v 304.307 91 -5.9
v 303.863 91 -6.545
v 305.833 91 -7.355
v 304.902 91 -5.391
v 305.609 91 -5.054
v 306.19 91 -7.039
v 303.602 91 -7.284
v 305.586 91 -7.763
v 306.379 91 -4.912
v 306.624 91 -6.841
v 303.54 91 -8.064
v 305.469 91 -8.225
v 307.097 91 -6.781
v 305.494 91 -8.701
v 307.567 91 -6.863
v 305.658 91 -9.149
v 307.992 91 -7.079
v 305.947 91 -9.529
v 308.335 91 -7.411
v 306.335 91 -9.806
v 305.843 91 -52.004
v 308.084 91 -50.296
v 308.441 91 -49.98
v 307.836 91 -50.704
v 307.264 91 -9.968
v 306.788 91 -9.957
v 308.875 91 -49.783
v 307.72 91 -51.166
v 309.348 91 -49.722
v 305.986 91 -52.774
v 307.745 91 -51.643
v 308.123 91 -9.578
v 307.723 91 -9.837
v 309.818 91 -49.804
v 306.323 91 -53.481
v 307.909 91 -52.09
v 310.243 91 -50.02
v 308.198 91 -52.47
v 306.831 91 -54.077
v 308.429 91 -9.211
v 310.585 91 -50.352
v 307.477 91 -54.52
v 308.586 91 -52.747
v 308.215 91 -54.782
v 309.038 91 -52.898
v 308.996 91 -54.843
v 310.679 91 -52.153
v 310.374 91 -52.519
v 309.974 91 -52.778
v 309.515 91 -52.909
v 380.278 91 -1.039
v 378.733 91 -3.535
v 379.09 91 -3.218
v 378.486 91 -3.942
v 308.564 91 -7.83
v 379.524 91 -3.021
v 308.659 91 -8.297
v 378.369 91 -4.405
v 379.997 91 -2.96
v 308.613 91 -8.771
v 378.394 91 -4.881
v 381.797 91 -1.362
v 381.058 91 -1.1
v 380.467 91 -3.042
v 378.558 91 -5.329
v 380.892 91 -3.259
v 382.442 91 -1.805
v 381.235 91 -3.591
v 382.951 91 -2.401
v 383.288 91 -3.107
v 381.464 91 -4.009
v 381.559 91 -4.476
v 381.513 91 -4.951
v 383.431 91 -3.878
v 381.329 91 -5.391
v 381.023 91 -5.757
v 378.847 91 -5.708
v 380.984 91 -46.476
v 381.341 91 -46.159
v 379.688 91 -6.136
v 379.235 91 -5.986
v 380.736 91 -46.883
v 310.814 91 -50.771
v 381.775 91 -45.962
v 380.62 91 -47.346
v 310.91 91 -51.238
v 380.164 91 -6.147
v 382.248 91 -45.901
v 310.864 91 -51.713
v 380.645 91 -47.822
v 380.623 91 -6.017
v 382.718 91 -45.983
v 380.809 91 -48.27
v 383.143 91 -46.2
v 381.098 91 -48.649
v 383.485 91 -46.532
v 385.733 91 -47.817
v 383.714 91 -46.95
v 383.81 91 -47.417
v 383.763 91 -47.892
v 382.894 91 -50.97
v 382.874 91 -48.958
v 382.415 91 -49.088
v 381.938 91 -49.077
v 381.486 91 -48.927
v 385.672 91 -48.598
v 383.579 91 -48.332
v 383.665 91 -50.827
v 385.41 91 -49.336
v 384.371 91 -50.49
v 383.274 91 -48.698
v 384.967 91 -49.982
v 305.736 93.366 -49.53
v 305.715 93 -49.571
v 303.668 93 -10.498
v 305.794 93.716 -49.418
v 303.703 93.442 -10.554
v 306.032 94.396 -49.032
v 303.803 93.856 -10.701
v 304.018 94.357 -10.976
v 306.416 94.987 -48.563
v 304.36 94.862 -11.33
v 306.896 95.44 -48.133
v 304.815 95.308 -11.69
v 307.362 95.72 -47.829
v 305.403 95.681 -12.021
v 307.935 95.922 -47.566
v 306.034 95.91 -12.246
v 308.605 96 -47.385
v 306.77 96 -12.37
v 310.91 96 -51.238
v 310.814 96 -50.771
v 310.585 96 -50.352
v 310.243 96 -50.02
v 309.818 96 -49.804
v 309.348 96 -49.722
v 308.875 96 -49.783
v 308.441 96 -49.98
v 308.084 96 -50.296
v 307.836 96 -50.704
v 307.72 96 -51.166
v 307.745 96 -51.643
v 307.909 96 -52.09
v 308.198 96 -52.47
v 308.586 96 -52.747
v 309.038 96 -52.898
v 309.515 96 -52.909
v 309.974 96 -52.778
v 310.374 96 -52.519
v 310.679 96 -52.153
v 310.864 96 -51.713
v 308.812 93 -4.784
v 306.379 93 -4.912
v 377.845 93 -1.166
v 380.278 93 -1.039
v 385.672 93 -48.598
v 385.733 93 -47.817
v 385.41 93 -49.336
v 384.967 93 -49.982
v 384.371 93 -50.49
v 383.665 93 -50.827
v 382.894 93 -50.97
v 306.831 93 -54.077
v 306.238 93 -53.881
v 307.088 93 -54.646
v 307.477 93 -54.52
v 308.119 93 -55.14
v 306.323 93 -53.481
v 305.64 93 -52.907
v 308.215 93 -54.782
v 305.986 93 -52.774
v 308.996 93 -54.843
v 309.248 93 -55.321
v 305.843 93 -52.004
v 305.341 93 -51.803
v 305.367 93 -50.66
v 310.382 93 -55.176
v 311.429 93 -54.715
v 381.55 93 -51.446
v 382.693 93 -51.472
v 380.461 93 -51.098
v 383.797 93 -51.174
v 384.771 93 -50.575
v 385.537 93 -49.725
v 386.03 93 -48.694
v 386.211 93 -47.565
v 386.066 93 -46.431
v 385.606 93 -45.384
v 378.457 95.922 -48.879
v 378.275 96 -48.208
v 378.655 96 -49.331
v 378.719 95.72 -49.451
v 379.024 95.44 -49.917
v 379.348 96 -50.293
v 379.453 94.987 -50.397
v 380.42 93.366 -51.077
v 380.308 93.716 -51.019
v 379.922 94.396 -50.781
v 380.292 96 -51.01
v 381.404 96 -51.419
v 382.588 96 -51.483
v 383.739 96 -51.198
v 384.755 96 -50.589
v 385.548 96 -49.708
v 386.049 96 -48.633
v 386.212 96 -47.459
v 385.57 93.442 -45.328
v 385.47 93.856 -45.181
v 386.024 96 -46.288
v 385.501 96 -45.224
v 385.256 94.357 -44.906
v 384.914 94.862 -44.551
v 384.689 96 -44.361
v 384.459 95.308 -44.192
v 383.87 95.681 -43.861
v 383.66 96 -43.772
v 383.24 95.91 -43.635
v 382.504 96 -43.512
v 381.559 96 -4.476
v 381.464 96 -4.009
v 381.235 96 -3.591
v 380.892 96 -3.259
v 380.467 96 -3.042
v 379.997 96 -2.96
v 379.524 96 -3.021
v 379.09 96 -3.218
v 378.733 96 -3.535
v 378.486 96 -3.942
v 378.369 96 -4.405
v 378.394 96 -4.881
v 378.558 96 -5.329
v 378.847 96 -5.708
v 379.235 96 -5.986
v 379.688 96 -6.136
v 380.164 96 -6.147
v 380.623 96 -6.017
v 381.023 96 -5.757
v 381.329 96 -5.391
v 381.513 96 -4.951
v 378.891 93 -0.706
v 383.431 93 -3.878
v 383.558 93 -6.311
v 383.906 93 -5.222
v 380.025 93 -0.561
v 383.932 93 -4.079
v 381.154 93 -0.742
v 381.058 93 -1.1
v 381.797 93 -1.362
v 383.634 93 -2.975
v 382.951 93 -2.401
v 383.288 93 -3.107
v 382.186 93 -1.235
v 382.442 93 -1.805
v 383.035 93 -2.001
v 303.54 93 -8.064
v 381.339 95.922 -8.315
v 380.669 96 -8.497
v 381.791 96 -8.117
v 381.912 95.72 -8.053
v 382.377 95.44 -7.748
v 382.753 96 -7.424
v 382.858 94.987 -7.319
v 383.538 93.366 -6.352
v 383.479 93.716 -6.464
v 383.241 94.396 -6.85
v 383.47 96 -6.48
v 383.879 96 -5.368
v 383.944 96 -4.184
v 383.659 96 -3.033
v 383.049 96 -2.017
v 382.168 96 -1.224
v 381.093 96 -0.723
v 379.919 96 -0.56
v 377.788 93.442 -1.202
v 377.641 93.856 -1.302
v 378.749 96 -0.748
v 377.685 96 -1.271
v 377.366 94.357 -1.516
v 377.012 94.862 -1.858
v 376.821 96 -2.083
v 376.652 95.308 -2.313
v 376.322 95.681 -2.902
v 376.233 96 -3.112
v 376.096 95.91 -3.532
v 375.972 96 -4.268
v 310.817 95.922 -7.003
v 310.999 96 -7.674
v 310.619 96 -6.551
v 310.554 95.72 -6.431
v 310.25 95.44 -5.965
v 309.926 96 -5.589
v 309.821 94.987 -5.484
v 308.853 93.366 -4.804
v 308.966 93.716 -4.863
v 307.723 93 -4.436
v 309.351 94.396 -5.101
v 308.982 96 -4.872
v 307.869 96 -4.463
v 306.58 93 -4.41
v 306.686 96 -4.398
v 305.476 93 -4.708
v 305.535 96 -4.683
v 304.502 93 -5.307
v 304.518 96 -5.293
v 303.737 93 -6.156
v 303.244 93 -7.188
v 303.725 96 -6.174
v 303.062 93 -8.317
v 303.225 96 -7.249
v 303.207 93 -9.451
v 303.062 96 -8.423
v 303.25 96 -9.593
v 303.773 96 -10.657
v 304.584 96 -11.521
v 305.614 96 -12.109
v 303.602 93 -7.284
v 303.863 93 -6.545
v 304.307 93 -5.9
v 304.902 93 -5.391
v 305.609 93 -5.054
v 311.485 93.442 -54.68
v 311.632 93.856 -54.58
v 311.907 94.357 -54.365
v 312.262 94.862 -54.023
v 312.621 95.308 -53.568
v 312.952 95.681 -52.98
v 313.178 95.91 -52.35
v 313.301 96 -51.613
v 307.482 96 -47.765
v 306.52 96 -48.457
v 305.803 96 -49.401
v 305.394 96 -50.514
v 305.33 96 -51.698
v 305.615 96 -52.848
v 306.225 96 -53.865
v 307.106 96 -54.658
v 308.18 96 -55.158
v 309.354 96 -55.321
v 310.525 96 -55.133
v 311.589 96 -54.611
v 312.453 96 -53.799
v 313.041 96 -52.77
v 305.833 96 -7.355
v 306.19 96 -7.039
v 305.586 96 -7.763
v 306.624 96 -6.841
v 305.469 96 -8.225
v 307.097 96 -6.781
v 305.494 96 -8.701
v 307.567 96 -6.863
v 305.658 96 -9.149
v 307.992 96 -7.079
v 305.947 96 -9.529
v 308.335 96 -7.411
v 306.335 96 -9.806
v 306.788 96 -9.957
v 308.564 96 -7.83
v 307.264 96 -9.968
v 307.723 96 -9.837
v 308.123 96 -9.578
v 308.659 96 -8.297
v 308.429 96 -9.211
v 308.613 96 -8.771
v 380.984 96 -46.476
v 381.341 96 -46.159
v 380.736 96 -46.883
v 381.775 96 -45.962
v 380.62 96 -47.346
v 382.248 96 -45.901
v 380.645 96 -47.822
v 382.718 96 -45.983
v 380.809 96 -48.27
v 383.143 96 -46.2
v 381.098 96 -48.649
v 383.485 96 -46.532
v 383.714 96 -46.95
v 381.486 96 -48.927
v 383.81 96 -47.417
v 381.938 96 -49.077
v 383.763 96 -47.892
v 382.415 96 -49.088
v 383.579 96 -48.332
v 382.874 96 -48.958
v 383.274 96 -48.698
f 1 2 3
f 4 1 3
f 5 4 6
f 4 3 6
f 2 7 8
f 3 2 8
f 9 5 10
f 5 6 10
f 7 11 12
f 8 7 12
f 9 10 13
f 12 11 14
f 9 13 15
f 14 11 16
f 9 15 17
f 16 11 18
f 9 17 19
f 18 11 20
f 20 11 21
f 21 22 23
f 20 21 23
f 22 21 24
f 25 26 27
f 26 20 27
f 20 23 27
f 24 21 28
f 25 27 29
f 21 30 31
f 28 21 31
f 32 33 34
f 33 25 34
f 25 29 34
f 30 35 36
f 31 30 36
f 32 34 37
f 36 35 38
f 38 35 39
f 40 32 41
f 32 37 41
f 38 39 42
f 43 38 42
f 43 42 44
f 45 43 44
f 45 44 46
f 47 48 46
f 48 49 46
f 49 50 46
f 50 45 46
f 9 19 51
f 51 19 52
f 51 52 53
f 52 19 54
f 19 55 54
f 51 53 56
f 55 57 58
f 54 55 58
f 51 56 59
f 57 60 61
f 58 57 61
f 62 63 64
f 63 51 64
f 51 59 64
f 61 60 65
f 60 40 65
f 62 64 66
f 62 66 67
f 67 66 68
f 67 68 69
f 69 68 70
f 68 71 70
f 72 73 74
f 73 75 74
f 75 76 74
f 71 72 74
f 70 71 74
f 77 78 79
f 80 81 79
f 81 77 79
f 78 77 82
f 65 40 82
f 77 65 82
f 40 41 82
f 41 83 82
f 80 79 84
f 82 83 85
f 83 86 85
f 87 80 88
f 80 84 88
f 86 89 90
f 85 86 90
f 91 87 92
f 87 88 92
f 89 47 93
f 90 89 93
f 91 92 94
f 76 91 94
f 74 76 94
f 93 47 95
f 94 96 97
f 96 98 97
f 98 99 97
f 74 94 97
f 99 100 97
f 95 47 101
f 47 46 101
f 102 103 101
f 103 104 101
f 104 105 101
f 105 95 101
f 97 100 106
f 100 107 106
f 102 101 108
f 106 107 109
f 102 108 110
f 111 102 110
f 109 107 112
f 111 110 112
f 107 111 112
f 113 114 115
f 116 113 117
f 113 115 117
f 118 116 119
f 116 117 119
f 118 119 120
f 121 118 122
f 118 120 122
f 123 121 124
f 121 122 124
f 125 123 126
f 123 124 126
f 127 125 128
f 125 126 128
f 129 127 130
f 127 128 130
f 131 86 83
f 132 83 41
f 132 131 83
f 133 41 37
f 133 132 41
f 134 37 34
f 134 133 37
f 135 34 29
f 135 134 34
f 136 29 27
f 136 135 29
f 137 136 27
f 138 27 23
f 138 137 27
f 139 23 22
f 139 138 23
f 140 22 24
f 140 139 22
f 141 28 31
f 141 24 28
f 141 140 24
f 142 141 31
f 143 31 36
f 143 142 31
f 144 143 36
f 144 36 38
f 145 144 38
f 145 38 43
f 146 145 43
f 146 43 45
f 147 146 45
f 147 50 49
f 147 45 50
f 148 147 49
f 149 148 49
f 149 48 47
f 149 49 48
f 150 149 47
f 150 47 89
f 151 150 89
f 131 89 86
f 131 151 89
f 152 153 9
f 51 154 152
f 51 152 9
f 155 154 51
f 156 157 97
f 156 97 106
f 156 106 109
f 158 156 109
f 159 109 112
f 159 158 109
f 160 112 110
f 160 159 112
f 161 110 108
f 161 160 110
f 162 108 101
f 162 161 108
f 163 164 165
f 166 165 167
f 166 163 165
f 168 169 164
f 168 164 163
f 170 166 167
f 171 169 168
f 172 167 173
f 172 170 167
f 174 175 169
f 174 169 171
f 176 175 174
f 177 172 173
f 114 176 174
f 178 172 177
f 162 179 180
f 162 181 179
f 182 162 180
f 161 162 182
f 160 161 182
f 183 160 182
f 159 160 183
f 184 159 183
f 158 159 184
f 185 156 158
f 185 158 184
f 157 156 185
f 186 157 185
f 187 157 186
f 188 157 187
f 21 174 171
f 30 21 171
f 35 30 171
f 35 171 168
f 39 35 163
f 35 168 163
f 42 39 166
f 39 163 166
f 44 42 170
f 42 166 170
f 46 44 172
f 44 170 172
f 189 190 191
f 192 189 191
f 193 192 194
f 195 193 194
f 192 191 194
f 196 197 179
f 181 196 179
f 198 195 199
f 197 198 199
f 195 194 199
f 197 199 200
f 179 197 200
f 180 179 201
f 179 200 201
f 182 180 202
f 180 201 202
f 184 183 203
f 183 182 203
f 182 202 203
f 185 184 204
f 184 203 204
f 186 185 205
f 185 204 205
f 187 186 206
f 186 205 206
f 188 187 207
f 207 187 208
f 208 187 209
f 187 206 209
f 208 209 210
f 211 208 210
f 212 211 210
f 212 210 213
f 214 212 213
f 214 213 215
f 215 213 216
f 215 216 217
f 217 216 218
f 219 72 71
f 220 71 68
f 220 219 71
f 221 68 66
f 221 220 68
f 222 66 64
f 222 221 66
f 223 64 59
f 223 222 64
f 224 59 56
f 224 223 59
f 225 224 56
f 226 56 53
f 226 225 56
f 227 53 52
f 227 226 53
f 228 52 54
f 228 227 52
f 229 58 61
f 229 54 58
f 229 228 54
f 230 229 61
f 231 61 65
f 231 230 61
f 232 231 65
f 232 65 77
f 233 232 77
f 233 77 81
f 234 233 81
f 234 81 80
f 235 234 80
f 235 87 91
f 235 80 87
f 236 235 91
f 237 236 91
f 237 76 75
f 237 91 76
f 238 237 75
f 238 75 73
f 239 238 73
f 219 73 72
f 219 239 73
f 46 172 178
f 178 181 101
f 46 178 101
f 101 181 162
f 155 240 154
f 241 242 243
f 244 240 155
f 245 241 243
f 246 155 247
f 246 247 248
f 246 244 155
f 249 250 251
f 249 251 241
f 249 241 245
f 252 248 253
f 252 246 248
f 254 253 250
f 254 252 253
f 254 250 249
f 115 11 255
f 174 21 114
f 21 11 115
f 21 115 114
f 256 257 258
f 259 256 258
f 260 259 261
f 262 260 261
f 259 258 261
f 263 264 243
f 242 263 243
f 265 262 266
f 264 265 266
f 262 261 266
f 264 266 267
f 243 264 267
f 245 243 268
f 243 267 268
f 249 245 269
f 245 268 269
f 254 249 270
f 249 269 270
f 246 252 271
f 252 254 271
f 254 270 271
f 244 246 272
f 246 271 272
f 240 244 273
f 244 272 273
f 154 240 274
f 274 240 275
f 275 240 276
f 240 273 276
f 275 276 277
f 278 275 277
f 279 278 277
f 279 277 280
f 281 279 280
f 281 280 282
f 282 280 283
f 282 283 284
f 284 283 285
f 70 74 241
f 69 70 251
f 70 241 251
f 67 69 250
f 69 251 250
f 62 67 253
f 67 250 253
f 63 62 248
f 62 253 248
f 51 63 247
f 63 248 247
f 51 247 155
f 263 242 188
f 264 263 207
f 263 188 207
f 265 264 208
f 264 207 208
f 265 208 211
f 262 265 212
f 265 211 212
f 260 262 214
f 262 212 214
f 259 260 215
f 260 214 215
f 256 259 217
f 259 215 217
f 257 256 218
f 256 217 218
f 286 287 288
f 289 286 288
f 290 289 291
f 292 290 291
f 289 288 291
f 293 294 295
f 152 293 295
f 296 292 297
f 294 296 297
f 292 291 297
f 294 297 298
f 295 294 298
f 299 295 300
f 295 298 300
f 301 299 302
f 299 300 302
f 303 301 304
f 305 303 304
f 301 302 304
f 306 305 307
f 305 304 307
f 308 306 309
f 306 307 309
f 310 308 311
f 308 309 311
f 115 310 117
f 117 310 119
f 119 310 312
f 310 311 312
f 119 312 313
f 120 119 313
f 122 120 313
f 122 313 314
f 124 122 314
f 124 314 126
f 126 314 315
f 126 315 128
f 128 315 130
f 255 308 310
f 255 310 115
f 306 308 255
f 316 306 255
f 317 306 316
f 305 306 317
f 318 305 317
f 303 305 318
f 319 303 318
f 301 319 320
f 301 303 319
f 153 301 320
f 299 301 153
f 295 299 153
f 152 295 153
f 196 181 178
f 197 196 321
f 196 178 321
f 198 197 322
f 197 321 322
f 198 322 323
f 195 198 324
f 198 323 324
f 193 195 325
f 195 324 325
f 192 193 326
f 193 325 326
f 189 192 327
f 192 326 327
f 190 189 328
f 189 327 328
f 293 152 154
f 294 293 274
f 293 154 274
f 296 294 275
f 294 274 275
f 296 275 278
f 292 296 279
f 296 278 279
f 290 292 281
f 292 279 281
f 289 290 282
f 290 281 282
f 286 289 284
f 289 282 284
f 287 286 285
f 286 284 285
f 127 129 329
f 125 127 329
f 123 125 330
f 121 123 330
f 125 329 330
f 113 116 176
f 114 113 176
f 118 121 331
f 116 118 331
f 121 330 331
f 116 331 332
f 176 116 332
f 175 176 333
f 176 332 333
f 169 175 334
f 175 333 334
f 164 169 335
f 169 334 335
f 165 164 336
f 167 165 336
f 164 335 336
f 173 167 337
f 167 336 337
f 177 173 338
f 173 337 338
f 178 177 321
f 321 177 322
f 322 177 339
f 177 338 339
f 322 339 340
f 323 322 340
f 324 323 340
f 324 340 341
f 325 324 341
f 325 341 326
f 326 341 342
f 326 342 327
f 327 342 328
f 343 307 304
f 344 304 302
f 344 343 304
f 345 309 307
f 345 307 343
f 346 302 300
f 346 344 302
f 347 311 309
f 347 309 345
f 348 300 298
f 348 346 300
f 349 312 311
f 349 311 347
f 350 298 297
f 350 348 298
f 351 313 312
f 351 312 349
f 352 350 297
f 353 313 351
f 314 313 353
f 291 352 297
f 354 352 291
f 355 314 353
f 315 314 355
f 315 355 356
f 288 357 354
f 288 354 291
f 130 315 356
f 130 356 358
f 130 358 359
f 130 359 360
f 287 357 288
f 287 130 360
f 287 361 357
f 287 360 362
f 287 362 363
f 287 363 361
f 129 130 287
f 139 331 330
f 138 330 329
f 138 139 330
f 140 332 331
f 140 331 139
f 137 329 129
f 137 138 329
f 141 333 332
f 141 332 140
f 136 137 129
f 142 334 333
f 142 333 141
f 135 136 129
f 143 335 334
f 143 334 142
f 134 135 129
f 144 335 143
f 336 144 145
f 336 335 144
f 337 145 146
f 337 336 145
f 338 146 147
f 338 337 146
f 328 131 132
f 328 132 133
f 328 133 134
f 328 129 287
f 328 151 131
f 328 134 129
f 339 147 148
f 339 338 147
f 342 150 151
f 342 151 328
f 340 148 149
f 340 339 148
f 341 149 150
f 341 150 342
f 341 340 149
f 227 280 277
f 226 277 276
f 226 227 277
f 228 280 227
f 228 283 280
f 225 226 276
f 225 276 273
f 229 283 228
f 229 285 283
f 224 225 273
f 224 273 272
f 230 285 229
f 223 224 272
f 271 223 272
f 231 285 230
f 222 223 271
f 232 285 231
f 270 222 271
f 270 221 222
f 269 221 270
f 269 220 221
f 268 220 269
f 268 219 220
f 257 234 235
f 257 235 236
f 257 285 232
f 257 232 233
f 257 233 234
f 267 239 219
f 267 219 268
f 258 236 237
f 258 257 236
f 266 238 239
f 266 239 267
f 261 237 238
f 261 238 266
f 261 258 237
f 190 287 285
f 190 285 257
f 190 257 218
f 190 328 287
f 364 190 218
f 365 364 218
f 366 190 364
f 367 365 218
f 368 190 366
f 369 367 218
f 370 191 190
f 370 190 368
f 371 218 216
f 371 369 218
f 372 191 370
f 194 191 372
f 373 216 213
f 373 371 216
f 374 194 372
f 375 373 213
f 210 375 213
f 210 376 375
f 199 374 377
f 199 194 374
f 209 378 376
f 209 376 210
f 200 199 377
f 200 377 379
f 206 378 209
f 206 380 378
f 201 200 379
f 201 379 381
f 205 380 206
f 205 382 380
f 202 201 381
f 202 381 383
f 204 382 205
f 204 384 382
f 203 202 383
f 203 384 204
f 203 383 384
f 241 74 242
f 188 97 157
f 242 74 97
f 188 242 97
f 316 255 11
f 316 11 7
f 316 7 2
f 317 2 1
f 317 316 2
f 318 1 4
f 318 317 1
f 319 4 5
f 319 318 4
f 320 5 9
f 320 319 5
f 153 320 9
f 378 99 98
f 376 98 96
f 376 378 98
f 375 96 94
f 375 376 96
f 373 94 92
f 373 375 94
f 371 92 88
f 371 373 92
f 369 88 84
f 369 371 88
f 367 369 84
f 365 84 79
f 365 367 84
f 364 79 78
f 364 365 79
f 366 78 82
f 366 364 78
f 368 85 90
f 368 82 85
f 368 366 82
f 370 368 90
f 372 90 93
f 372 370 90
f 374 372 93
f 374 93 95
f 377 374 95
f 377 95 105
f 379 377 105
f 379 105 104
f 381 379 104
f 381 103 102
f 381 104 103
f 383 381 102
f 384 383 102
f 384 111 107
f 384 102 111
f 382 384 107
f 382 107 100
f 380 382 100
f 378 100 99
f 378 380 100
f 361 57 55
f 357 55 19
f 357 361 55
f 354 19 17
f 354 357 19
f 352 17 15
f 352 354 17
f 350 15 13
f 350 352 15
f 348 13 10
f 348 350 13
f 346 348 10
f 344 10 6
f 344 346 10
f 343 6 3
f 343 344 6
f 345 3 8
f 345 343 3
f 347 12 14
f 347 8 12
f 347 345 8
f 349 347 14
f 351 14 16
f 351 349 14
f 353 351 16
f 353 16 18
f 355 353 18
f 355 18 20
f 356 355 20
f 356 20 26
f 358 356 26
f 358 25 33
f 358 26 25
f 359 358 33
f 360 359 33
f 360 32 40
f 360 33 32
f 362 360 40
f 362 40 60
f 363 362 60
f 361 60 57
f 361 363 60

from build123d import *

# Parameters (mm, degrees)
CYLINDER083_R          = 1.6
CYLINDER083_DEPTH      = 10
CYLINDER081_R          = 1.6
CYLINDER081_DEPTH      = 10
CYLINDER082_R          = 1.6
CYLINDER082_DEPTH      = 10
CYLINDER084_R          = 1.6
CYLINDER084_DEPTH      = 10
CYLINDER095_R          = 4
CYLINDER095_DEPTH      = 3
CYLINDER096_R          = 4
CYLINDER096_DEPTH      = 3
CYLINDER097_R          = 4
CYLINDER097_DEPTH      = 3
CYLINDER094_R          = 4
CYLINDER094_DEPTH      = 3
BOX039_W               = 80
BOX039_H               = 5
BOX039_DEPTH           = 50
FILLET028_R            = 3
FILLET029_R            = 3
CUT063_PLACEMENT_ANGLE = 3


with BuildPart() as cylinder083:
    # Cylinder083 → Cylinder083 (new body)
    with BuildSketch(Plane(origin=(76.5, 96, 46.5), x_dir=(1, 0, 0), z_dir=(0, -1, 0))):
        Circle(CYLINDER083_R)
    extrude(amount=CYLINDER083_DEPTH)


with BuildPart() as cylinder081:
    # Cylinder081 → Cylinder081 (new body)
    with BuildSketch(Plane(origin=(76.5, 96, 3.5), x_dir=(1, 0, 0), z_dir=(0, -1, 0))):
        Circle(CYLINDER081_R)
    extrude(amount=CYLINDER081_DEPTH)


with BuildPart() as cylinder082:
    # Cylinder082 → Cylinder082 (new body)
    with BuildSketch(Plane(origin=(3.5, 96, 46.5), x_dir=(1, 0, 0), z_dir=(0, -1, 0))):
        Circle(CYLINDER082_R)
    extrude(amount=CYLINDER082_DEPTH)


with BuildPart() as fusion073:
    # Cylinder084 → Cylinder084 (new body)
    with BuildSketch(Plane(origin=(3.5, 96, 3.5), x_dir=(1, 0, 0), z_dir=(0, -1, 0))):
        Circle(CYLINDER084_R)
    extrude(amount=CYLINDER084_DEPTH)

    # Fusion073: union Cylinder083, Cylinder081, Cylinder082
    add(cylinder083.part)
    add(cylinder081.part)
    add(cylinder082.part)


with BuildPart() as fusion073_1:
    # Fusion073 placement: moved
    add(fusion073.part.moved(Location((0, 5, 0))))


with BuildPart() as cylinder095:
    # Cylinder095 → Cylinder095 (new body)
    with BuildSketch(Plane(origin=(76.5, 96, 46.5), x_dir=(1, 0, 0), z_dir=(0, -1, 0))):
        Circle(CYLINDER095_R)
    extrude(amount=CYLINDER095_DEPTH)


with BuildPart() as cylinder096:
    # Cylinder096 → Cylinder096 (new body)
    with BuildSketch(Plane(origin=(76.5, 96, 3.5), x_dir=(1, 0, 0), z_dir=(0, -1, 0))):
        Circle(CYLINDER096_R)
    extrude(amount=CYLINDER096_DEPTH)


with BuildPart() as cylinder097:
    # Cylinder097 → Cylinder097 (new body)
    with BuildSketch(Plane(origin=(3.5, 96, 46.5), x_dir=(1, 0, 0), z_dir=(0, -1, 0))):
        Circle(CYLINDER097_R)
    extrude(amount=CYLINDER097_DEPTH)


with BuildPart() as fusion082:
    # Cylinder094 → Cylinder094 (new body)
    with BuildSketch(Plane(origin=(3.5, 96, 3.5), x_dir=(1, 0, 0), z_dir=(0, -1, 0))):
        Circle(CYLINDER094_R)
    extrude(amount=CYLINDER094_DEPTH)

    # Fusion082: union Cylinder095, Cylinder096, Cylinder097
    add(cylinder095.part)
    add(cylinder096.part)
    add(cylinder097.part)


with BuildPart() as fusion082_1:
    # Fusion082 placement: moved
    add(fusion082.part.moved(Location((0, 5, 0))))


with BuildPart() as battery_holder_cap:
    # Box039 → Box039 (new body)
    with BuildSketch(Plane(origin=(0, 96, 0), x_dir=(1, 0, 0), z_dir=(0, 0, 1))):
        with Locations((40, 2.5)):
            Rectangle(BOX039_W, BOX039_H)
    extrude(amount=BOX039_DEPTH)

    # Fillet028
    fillet028_edges = [battery_holder_cap.edges().sort_by_distance(p)[0] for p in [
        (0, 98.5, 50),
        (0, 98.5, 0),
        (80, 98.5, 50),
        (80, 98.5, 0),
    ]]
    fillet(fillet028_edges, radius=FILLET028_R)

    # Fillet029
    fillet029_edges = [battery_holder_cap.edges().sort_by_distance(p)[0] for p in [
        (0, 101, 25),
        (40, 101, 0),
        (80, 101, 25),
        (40, 101, 50),
    ]]
    fillet(fillet029_edges, radius=FILLET029_R)

    # Fusion102: union Fusion082
    add(fusion082_1.part)

    # Cut063: cut Fusion073
    add(fusion073_1.part, mode=Mode.SUBTRACT)


with BuildPart() as battery_holder_cap_1:
    # Cut063 placement: moved
    add(battery_holder_cap.part.moved(Location((306, -5, -55))).rotate(Axis((306, -5, -55), (0, -1, 0)), CUT063_PLACEMENT_ANGLE))


solid = battery_holder_cap_1.part
